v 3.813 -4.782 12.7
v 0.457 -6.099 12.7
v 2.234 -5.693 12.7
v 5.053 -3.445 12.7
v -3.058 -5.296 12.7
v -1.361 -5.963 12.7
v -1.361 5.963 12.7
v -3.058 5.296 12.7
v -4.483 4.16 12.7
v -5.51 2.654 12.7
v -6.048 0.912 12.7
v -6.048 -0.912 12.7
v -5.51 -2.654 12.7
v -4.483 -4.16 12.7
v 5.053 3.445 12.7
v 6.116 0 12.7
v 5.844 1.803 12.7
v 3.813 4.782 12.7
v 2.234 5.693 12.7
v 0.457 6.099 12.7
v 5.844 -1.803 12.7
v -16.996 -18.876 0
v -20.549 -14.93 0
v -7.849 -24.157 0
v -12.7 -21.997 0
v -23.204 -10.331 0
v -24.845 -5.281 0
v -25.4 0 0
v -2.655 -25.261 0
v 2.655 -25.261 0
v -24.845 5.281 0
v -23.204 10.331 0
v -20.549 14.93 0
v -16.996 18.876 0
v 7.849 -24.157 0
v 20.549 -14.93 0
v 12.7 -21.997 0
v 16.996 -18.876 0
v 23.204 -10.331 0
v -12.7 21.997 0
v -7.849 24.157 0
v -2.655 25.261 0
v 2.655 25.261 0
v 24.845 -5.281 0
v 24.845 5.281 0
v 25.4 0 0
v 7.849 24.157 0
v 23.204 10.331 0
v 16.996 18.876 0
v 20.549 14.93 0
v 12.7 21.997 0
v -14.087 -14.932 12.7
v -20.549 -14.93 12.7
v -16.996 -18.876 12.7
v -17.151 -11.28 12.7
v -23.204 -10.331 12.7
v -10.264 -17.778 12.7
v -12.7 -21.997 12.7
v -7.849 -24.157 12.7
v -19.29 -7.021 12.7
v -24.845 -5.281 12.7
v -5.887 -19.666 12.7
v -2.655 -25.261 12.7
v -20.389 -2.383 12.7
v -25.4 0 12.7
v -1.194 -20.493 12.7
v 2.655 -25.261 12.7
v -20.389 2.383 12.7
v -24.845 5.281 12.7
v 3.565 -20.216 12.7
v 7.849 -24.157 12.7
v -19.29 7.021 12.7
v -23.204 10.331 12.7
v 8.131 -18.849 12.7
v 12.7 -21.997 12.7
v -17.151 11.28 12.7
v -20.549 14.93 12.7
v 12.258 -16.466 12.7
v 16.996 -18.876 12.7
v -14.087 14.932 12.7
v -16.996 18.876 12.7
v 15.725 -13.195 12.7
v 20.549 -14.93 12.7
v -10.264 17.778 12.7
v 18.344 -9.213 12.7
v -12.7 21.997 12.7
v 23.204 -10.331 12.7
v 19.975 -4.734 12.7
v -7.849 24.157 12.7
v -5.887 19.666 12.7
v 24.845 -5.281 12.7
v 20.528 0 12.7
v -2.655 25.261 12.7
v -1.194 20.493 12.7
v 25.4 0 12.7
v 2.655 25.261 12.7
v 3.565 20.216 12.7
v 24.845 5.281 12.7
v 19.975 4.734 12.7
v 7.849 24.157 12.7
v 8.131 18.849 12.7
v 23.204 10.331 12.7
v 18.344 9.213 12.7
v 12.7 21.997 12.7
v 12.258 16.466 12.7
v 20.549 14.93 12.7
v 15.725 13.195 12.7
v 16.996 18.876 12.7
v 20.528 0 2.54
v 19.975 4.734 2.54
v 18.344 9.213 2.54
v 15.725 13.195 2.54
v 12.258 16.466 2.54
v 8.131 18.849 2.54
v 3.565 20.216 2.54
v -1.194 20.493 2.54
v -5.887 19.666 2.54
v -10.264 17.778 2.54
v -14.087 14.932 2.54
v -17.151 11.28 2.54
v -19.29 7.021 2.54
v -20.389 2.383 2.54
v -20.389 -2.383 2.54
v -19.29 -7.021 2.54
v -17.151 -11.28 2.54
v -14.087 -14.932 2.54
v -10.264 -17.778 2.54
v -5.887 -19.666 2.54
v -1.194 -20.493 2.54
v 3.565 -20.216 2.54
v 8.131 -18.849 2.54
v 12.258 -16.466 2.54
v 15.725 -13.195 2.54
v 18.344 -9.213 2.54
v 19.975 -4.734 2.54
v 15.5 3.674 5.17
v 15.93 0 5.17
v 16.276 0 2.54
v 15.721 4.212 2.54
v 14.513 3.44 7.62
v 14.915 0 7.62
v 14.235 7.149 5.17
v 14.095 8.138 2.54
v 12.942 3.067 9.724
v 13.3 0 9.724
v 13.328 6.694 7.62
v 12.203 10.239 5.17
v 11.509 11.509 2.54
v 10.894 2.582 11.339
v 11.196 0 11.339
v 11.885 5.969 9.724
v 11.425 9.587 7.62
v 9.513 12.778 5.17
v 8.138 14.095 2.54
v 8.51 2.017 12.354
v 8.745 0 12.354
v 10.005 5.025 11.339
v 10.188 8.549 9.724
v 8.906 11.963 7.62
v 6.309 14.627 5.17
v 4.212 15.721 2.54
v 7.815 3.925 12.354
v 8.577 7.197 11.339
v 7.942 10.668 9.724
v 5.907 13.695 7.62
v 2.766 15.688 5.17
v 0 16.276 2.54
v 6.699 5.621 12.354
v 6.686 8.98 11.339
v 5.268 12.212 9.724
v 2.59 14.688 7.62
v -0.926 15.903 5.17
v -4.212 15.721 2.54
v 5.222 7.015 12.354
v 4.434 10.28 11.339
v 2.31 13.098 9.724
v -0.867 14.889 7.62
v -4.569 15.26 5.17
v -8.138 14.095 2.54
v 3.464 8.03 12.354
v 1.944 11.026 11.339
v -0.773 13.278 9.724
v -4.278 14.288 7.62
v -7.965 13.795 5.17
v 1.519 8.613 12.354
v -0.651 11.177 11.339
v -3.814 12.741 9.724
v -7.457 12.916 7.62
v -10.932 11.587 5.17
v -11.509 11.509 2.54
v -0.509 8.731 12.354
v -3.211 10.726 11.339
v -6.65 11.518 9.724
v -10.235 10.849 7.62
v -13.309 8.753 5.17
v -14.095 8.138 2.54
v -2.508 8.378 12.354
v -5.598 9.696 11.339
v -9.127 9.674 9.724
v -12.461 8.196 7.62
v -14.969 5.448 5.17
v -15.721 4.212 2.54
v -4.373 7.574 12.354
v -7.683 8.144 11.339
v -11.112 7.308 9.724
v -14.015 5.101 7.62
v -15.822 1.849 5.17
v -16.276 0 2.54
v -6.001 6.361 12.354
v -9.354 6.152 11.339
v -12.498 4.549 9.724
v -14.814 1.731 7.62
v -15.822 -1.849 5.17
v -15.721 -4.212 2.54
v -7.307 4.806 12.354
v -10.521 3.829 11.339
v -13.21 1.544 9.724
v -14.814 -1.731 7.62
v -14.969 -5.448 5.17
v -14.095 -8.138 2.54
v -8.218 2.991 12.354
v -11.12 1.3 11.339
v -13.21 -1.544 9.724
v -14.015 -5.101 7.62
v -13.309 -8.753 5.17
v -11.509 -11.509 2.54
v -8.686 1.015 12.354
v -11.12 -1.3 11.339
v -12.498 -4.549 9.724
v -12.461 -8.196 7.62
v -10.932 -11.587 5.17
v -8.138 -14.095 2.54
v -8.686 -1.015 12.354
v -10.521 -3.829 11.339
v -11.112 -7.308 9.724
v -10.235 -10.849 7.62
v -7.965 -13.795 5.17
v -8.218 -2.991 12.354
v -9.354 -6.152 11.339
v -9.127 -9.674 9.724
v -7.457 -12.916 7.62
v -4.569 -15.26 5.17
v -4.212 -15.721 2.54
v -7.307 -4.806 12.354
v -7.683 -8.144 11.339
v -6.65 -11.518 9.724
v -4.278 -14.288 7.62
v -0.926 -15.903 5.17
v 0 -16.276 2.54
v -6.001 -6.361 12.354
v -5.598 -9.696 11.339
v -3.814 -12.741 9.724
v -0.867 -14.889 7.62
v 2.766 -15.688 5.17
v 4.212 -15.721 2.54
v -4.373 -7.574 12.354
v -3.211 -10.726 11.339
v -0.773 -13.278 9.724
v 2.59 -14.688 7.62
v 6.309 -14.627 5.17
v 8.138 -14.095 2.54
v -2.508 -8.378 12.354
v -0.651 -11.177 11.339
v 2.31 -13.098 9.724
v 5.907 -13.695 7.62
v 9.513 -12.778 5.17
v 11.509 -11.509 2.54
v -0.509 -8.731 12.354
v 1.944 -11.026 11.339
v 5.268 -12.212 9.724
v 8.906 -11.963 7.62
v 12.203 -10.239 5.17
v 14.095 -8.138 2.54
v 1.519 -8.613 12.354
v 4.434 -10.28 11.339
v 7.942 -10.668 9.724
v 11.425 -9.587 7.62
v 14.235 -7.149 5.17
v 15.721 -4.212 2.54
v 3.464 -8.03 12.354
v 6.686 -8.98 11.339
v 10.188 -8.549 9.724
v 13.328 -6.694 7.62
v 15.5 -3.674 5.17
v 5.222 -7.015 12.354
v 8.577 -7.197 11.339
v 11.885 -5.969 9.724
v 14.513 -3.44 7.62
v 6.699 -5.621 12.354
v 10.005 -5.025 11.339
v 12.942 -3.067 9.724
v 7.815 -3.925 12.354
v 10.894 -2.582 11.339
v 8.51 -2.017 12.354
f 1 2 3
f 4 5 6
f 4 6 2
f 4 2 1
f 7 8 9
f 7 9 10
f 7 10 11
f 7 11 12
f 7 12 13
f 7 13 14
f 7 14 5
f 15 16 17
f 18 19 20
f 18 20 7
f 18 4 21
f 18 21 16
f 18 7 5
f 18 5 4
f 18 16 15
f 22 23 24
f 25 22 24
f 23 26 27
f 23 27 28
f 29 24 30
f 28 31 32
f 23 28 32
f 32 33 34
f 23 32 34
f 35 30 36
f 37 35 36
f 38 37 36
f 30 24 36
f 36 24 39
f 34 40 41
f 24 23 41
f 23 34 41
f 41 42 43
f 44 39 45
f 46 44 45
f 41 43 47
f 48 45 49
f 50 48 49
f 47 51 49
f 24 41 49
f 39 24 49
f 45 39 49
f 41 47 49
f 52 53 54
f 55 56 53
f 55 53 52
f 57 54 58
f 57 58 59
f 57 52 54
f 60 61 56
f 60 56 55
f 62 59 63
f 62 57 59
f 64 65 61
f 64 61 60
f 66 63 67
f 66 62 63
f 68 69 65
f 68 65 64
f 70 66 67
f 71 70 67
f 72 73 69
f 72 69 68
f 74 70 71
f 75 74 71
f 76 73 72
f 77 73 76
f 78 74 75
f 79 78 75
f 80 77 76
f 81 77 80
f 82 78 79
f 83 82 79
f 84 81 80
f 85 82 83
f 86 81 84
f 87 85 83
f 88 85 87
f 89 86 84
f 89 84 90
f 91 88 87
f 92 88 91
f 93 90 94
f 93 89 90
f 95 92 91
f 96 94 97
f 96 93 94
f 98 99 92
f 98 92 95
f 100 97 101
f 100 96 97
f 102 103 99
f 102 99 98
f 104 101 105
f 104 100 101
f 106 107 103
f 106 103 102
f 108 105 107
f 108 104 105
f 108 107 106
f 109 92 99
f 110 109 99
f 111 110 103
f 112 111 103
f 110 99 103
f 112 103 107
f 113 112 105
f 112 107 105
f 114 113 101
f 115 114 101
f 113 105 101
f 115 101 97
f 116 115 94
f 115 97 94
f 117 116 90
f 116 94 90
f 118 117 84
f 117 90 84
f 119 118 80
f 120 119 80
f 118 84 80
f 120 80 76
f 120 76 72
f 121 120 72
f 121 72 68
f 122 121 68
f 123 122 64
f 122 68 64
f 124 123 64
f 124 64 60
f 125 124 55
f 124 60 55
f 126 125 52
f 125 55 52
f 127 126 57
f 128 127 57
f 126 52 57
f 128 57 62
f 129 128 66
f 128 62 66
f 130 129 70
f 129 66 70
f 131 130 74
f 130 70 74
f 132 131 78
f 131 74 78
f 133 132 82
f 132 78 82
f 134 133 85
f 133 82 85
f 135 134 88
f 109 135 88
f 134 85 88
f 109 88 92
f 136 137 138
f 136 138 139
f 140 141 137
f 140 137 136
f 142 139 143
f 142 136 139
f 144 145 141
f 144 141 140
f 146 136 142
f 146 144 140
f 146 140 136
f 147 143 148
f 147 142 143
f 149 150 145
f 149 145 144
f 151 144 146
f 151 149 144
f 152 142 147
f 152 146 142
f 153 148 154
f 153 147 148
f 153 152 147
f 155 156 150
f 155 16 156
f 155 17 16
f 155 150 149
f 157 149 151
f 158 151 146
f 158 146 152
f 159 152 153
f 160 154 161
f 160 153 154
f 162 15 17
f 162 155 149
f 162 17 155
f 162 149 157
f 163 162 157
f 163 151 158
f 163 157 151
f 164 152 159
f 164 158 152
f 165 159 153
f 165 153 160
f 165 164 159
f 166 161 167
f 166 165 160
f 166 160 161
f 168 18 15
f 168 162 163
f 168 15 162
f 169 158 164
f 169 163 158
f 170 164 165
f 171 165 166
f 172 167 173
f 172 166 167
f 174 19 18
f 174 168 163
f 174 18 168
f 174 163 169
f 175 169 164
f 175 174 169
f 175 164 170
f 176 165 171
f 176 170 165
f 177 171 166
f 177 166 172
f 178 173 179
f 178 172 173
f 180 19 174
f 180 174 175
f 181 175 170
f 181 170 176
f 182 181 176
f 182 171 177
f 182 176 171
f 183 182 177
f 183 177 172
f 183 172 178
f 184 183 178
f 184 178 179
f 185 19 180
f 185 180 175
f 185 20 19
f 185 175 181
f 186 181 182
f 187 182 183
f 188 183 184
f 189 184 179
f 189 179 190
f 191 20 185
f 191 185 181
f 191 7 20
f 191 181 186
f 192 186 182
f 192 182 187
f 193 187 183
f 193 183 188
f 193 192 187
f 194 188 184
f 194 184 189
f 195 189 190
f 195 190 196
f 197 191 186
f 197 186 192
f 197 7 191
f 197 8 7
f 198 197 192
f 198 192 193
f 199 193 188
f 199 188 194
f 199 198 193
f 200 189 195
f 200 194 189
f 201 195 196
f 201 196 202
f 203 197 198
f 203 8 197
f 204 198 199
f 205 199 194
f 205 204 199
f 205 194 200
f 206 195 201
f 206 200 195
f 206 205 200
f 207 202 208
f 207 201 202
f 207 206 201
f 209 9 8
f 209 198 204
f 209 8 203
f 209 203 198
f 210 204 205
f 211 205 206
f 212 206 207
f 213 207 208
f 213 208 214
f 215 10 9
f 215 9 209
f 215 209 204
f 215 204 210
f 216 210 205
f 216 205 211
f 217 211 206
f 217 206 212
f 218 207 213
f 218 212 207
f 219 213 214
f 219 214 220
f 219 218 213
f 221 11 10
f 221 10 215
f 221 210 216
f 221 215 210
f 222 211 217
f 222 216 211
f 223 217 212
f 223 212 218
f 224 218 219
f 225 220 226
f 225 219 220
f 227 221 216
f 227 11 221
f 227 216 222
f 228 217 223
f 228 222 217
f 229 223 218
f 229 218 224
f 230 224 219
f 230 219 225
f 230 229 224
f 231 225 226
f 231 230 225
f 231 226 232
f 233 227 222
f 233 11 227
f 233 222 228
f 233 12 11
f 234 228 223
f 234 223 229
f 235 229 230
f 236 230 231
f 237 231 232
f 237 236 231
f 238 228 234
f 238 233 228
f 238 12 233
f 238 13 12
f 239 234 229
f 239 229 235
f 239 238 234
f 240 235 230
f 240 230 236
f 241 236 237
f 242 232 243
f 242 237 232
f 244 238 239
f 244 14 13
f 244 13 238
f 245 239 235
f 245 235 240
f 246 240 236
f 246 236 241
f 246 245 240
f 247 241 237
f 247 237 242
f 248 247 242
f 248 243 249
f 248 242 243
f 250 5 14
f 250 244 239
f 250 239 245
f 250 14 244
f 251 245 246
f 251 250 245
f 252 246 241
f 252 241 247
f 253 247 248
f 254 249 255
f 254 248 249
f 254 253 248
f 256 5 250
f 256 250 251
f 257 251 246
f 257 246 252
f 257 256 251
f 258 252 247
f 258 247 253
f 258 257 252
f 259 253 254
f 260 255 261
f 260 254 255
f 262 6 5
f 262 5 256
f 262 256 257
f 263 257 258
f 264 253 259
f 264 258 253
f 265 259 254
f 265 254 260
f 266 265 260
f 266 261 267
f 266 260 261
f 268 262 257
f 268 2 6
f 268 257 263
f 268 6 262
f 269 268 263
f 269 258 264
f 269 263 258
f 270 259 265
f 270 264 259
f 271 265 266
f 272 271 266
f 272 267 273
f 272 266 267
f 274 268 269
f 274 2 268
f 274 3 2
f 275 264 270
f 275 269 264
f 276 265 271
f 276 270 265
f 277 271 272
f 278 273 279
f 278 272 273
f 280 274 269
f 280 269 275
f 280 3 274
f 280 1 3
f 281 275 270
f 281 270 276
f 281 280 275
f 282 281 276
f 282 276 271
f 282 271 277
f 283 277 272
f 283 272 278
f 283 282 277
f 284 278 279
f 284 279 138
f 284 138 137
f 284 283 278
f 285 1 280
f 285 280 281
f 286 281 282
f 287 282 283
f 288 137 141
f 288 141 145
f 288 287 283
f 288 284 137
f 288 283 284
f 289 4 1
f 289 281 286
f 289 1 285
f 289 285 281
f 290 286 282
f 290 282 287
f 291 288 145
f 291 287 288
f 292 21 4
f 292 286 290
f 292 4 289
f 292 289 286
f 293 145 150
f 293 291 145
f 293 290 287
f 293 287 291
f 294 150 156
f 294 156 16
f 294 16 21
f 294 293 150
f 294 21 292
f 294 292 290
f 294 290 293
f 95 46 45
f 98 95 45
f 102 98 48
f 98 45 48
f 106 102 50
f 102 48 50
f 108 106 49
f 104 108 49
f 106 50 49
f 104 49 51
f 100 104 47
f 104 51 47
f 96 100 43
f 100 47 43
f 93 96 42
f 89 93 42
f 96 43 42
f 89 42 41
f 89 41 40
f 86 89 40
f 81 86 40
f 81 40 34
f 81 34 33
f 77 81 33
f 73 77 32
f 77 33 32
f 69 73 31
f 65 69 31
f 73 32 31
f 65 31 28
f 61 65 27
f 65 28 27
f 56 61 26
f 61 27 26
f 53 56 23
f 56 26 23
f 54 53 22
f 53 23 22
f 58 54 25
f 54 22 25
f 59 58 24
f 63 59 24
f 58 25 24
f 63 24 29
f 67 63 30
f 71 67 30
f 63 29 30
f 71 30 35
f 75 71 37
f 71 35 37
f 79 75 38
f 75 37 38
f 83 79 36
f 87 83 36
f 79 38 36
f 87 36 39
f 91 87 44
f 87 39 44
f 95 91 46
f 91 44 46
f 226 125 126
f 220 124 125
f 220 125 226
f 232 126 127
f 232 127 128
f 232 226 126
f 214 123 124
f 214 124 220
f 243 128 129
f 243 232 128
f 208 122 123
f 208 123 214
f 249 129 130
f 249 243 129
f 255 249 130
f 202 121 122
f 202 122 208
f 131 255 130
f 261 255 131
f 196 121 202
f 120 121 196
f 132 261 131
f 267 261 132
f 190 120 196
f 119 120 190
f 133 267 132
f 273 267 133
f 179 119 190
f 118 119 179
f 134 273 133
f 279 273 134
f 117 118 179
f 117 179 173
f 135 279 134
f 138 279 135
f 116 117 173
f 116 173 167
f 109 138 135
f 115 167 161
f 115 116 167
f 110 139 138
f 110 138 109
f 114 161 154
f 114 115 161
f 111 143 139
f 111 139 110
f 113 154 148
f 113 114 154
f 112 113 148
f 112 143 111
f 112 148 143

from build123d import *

# Parameters (mm, degrees)
F0_R     = 25.4
F1_DEPTH = 12.7
F2_R     = 20.5279895556
F3_DEPTH = 10.16
F4_R     = 16.2758477469
F5_DEPTH = 10.16
F6_R     = 10.15999


# Not quite as in the source:
# - a fillet or chamfer is up to 0.001 mm smaller than in the source, because OpenCascade refuses the exact size


with BuildPart() as f1:
    # F0 (on Top) → F1 (new body)
    with BuildSketch(Plane.XY):
        Circle(F0_R)
    extrude(amount=F1_DEPTH)

    # F2 (on face) → F3 (cut)
    with BuildSketch(Plane.XY.offset(12.7)):
        Circle(F2_R)
    extrude(amount=-F3_DEPTH, mode=Mode.SUBTRACT)

    # F4 (on face) → F5 (join)
    with BuildSketch(Plane.XY.offset(2.54)):
        Circle(F4_R)
    extrude(amount=F5_DEPTH)

    # F6 (radius 10.16 in the source; OpenCascade refuses exactly that, so slightly less here)
    f6_edges = [f1.edges().sort_by_distance(p)[0] for p in [
        (-16.275848, 0, 12.7),
    ]]
    fillet(f6_edges, radius=F6_R)


solid = f1.part
